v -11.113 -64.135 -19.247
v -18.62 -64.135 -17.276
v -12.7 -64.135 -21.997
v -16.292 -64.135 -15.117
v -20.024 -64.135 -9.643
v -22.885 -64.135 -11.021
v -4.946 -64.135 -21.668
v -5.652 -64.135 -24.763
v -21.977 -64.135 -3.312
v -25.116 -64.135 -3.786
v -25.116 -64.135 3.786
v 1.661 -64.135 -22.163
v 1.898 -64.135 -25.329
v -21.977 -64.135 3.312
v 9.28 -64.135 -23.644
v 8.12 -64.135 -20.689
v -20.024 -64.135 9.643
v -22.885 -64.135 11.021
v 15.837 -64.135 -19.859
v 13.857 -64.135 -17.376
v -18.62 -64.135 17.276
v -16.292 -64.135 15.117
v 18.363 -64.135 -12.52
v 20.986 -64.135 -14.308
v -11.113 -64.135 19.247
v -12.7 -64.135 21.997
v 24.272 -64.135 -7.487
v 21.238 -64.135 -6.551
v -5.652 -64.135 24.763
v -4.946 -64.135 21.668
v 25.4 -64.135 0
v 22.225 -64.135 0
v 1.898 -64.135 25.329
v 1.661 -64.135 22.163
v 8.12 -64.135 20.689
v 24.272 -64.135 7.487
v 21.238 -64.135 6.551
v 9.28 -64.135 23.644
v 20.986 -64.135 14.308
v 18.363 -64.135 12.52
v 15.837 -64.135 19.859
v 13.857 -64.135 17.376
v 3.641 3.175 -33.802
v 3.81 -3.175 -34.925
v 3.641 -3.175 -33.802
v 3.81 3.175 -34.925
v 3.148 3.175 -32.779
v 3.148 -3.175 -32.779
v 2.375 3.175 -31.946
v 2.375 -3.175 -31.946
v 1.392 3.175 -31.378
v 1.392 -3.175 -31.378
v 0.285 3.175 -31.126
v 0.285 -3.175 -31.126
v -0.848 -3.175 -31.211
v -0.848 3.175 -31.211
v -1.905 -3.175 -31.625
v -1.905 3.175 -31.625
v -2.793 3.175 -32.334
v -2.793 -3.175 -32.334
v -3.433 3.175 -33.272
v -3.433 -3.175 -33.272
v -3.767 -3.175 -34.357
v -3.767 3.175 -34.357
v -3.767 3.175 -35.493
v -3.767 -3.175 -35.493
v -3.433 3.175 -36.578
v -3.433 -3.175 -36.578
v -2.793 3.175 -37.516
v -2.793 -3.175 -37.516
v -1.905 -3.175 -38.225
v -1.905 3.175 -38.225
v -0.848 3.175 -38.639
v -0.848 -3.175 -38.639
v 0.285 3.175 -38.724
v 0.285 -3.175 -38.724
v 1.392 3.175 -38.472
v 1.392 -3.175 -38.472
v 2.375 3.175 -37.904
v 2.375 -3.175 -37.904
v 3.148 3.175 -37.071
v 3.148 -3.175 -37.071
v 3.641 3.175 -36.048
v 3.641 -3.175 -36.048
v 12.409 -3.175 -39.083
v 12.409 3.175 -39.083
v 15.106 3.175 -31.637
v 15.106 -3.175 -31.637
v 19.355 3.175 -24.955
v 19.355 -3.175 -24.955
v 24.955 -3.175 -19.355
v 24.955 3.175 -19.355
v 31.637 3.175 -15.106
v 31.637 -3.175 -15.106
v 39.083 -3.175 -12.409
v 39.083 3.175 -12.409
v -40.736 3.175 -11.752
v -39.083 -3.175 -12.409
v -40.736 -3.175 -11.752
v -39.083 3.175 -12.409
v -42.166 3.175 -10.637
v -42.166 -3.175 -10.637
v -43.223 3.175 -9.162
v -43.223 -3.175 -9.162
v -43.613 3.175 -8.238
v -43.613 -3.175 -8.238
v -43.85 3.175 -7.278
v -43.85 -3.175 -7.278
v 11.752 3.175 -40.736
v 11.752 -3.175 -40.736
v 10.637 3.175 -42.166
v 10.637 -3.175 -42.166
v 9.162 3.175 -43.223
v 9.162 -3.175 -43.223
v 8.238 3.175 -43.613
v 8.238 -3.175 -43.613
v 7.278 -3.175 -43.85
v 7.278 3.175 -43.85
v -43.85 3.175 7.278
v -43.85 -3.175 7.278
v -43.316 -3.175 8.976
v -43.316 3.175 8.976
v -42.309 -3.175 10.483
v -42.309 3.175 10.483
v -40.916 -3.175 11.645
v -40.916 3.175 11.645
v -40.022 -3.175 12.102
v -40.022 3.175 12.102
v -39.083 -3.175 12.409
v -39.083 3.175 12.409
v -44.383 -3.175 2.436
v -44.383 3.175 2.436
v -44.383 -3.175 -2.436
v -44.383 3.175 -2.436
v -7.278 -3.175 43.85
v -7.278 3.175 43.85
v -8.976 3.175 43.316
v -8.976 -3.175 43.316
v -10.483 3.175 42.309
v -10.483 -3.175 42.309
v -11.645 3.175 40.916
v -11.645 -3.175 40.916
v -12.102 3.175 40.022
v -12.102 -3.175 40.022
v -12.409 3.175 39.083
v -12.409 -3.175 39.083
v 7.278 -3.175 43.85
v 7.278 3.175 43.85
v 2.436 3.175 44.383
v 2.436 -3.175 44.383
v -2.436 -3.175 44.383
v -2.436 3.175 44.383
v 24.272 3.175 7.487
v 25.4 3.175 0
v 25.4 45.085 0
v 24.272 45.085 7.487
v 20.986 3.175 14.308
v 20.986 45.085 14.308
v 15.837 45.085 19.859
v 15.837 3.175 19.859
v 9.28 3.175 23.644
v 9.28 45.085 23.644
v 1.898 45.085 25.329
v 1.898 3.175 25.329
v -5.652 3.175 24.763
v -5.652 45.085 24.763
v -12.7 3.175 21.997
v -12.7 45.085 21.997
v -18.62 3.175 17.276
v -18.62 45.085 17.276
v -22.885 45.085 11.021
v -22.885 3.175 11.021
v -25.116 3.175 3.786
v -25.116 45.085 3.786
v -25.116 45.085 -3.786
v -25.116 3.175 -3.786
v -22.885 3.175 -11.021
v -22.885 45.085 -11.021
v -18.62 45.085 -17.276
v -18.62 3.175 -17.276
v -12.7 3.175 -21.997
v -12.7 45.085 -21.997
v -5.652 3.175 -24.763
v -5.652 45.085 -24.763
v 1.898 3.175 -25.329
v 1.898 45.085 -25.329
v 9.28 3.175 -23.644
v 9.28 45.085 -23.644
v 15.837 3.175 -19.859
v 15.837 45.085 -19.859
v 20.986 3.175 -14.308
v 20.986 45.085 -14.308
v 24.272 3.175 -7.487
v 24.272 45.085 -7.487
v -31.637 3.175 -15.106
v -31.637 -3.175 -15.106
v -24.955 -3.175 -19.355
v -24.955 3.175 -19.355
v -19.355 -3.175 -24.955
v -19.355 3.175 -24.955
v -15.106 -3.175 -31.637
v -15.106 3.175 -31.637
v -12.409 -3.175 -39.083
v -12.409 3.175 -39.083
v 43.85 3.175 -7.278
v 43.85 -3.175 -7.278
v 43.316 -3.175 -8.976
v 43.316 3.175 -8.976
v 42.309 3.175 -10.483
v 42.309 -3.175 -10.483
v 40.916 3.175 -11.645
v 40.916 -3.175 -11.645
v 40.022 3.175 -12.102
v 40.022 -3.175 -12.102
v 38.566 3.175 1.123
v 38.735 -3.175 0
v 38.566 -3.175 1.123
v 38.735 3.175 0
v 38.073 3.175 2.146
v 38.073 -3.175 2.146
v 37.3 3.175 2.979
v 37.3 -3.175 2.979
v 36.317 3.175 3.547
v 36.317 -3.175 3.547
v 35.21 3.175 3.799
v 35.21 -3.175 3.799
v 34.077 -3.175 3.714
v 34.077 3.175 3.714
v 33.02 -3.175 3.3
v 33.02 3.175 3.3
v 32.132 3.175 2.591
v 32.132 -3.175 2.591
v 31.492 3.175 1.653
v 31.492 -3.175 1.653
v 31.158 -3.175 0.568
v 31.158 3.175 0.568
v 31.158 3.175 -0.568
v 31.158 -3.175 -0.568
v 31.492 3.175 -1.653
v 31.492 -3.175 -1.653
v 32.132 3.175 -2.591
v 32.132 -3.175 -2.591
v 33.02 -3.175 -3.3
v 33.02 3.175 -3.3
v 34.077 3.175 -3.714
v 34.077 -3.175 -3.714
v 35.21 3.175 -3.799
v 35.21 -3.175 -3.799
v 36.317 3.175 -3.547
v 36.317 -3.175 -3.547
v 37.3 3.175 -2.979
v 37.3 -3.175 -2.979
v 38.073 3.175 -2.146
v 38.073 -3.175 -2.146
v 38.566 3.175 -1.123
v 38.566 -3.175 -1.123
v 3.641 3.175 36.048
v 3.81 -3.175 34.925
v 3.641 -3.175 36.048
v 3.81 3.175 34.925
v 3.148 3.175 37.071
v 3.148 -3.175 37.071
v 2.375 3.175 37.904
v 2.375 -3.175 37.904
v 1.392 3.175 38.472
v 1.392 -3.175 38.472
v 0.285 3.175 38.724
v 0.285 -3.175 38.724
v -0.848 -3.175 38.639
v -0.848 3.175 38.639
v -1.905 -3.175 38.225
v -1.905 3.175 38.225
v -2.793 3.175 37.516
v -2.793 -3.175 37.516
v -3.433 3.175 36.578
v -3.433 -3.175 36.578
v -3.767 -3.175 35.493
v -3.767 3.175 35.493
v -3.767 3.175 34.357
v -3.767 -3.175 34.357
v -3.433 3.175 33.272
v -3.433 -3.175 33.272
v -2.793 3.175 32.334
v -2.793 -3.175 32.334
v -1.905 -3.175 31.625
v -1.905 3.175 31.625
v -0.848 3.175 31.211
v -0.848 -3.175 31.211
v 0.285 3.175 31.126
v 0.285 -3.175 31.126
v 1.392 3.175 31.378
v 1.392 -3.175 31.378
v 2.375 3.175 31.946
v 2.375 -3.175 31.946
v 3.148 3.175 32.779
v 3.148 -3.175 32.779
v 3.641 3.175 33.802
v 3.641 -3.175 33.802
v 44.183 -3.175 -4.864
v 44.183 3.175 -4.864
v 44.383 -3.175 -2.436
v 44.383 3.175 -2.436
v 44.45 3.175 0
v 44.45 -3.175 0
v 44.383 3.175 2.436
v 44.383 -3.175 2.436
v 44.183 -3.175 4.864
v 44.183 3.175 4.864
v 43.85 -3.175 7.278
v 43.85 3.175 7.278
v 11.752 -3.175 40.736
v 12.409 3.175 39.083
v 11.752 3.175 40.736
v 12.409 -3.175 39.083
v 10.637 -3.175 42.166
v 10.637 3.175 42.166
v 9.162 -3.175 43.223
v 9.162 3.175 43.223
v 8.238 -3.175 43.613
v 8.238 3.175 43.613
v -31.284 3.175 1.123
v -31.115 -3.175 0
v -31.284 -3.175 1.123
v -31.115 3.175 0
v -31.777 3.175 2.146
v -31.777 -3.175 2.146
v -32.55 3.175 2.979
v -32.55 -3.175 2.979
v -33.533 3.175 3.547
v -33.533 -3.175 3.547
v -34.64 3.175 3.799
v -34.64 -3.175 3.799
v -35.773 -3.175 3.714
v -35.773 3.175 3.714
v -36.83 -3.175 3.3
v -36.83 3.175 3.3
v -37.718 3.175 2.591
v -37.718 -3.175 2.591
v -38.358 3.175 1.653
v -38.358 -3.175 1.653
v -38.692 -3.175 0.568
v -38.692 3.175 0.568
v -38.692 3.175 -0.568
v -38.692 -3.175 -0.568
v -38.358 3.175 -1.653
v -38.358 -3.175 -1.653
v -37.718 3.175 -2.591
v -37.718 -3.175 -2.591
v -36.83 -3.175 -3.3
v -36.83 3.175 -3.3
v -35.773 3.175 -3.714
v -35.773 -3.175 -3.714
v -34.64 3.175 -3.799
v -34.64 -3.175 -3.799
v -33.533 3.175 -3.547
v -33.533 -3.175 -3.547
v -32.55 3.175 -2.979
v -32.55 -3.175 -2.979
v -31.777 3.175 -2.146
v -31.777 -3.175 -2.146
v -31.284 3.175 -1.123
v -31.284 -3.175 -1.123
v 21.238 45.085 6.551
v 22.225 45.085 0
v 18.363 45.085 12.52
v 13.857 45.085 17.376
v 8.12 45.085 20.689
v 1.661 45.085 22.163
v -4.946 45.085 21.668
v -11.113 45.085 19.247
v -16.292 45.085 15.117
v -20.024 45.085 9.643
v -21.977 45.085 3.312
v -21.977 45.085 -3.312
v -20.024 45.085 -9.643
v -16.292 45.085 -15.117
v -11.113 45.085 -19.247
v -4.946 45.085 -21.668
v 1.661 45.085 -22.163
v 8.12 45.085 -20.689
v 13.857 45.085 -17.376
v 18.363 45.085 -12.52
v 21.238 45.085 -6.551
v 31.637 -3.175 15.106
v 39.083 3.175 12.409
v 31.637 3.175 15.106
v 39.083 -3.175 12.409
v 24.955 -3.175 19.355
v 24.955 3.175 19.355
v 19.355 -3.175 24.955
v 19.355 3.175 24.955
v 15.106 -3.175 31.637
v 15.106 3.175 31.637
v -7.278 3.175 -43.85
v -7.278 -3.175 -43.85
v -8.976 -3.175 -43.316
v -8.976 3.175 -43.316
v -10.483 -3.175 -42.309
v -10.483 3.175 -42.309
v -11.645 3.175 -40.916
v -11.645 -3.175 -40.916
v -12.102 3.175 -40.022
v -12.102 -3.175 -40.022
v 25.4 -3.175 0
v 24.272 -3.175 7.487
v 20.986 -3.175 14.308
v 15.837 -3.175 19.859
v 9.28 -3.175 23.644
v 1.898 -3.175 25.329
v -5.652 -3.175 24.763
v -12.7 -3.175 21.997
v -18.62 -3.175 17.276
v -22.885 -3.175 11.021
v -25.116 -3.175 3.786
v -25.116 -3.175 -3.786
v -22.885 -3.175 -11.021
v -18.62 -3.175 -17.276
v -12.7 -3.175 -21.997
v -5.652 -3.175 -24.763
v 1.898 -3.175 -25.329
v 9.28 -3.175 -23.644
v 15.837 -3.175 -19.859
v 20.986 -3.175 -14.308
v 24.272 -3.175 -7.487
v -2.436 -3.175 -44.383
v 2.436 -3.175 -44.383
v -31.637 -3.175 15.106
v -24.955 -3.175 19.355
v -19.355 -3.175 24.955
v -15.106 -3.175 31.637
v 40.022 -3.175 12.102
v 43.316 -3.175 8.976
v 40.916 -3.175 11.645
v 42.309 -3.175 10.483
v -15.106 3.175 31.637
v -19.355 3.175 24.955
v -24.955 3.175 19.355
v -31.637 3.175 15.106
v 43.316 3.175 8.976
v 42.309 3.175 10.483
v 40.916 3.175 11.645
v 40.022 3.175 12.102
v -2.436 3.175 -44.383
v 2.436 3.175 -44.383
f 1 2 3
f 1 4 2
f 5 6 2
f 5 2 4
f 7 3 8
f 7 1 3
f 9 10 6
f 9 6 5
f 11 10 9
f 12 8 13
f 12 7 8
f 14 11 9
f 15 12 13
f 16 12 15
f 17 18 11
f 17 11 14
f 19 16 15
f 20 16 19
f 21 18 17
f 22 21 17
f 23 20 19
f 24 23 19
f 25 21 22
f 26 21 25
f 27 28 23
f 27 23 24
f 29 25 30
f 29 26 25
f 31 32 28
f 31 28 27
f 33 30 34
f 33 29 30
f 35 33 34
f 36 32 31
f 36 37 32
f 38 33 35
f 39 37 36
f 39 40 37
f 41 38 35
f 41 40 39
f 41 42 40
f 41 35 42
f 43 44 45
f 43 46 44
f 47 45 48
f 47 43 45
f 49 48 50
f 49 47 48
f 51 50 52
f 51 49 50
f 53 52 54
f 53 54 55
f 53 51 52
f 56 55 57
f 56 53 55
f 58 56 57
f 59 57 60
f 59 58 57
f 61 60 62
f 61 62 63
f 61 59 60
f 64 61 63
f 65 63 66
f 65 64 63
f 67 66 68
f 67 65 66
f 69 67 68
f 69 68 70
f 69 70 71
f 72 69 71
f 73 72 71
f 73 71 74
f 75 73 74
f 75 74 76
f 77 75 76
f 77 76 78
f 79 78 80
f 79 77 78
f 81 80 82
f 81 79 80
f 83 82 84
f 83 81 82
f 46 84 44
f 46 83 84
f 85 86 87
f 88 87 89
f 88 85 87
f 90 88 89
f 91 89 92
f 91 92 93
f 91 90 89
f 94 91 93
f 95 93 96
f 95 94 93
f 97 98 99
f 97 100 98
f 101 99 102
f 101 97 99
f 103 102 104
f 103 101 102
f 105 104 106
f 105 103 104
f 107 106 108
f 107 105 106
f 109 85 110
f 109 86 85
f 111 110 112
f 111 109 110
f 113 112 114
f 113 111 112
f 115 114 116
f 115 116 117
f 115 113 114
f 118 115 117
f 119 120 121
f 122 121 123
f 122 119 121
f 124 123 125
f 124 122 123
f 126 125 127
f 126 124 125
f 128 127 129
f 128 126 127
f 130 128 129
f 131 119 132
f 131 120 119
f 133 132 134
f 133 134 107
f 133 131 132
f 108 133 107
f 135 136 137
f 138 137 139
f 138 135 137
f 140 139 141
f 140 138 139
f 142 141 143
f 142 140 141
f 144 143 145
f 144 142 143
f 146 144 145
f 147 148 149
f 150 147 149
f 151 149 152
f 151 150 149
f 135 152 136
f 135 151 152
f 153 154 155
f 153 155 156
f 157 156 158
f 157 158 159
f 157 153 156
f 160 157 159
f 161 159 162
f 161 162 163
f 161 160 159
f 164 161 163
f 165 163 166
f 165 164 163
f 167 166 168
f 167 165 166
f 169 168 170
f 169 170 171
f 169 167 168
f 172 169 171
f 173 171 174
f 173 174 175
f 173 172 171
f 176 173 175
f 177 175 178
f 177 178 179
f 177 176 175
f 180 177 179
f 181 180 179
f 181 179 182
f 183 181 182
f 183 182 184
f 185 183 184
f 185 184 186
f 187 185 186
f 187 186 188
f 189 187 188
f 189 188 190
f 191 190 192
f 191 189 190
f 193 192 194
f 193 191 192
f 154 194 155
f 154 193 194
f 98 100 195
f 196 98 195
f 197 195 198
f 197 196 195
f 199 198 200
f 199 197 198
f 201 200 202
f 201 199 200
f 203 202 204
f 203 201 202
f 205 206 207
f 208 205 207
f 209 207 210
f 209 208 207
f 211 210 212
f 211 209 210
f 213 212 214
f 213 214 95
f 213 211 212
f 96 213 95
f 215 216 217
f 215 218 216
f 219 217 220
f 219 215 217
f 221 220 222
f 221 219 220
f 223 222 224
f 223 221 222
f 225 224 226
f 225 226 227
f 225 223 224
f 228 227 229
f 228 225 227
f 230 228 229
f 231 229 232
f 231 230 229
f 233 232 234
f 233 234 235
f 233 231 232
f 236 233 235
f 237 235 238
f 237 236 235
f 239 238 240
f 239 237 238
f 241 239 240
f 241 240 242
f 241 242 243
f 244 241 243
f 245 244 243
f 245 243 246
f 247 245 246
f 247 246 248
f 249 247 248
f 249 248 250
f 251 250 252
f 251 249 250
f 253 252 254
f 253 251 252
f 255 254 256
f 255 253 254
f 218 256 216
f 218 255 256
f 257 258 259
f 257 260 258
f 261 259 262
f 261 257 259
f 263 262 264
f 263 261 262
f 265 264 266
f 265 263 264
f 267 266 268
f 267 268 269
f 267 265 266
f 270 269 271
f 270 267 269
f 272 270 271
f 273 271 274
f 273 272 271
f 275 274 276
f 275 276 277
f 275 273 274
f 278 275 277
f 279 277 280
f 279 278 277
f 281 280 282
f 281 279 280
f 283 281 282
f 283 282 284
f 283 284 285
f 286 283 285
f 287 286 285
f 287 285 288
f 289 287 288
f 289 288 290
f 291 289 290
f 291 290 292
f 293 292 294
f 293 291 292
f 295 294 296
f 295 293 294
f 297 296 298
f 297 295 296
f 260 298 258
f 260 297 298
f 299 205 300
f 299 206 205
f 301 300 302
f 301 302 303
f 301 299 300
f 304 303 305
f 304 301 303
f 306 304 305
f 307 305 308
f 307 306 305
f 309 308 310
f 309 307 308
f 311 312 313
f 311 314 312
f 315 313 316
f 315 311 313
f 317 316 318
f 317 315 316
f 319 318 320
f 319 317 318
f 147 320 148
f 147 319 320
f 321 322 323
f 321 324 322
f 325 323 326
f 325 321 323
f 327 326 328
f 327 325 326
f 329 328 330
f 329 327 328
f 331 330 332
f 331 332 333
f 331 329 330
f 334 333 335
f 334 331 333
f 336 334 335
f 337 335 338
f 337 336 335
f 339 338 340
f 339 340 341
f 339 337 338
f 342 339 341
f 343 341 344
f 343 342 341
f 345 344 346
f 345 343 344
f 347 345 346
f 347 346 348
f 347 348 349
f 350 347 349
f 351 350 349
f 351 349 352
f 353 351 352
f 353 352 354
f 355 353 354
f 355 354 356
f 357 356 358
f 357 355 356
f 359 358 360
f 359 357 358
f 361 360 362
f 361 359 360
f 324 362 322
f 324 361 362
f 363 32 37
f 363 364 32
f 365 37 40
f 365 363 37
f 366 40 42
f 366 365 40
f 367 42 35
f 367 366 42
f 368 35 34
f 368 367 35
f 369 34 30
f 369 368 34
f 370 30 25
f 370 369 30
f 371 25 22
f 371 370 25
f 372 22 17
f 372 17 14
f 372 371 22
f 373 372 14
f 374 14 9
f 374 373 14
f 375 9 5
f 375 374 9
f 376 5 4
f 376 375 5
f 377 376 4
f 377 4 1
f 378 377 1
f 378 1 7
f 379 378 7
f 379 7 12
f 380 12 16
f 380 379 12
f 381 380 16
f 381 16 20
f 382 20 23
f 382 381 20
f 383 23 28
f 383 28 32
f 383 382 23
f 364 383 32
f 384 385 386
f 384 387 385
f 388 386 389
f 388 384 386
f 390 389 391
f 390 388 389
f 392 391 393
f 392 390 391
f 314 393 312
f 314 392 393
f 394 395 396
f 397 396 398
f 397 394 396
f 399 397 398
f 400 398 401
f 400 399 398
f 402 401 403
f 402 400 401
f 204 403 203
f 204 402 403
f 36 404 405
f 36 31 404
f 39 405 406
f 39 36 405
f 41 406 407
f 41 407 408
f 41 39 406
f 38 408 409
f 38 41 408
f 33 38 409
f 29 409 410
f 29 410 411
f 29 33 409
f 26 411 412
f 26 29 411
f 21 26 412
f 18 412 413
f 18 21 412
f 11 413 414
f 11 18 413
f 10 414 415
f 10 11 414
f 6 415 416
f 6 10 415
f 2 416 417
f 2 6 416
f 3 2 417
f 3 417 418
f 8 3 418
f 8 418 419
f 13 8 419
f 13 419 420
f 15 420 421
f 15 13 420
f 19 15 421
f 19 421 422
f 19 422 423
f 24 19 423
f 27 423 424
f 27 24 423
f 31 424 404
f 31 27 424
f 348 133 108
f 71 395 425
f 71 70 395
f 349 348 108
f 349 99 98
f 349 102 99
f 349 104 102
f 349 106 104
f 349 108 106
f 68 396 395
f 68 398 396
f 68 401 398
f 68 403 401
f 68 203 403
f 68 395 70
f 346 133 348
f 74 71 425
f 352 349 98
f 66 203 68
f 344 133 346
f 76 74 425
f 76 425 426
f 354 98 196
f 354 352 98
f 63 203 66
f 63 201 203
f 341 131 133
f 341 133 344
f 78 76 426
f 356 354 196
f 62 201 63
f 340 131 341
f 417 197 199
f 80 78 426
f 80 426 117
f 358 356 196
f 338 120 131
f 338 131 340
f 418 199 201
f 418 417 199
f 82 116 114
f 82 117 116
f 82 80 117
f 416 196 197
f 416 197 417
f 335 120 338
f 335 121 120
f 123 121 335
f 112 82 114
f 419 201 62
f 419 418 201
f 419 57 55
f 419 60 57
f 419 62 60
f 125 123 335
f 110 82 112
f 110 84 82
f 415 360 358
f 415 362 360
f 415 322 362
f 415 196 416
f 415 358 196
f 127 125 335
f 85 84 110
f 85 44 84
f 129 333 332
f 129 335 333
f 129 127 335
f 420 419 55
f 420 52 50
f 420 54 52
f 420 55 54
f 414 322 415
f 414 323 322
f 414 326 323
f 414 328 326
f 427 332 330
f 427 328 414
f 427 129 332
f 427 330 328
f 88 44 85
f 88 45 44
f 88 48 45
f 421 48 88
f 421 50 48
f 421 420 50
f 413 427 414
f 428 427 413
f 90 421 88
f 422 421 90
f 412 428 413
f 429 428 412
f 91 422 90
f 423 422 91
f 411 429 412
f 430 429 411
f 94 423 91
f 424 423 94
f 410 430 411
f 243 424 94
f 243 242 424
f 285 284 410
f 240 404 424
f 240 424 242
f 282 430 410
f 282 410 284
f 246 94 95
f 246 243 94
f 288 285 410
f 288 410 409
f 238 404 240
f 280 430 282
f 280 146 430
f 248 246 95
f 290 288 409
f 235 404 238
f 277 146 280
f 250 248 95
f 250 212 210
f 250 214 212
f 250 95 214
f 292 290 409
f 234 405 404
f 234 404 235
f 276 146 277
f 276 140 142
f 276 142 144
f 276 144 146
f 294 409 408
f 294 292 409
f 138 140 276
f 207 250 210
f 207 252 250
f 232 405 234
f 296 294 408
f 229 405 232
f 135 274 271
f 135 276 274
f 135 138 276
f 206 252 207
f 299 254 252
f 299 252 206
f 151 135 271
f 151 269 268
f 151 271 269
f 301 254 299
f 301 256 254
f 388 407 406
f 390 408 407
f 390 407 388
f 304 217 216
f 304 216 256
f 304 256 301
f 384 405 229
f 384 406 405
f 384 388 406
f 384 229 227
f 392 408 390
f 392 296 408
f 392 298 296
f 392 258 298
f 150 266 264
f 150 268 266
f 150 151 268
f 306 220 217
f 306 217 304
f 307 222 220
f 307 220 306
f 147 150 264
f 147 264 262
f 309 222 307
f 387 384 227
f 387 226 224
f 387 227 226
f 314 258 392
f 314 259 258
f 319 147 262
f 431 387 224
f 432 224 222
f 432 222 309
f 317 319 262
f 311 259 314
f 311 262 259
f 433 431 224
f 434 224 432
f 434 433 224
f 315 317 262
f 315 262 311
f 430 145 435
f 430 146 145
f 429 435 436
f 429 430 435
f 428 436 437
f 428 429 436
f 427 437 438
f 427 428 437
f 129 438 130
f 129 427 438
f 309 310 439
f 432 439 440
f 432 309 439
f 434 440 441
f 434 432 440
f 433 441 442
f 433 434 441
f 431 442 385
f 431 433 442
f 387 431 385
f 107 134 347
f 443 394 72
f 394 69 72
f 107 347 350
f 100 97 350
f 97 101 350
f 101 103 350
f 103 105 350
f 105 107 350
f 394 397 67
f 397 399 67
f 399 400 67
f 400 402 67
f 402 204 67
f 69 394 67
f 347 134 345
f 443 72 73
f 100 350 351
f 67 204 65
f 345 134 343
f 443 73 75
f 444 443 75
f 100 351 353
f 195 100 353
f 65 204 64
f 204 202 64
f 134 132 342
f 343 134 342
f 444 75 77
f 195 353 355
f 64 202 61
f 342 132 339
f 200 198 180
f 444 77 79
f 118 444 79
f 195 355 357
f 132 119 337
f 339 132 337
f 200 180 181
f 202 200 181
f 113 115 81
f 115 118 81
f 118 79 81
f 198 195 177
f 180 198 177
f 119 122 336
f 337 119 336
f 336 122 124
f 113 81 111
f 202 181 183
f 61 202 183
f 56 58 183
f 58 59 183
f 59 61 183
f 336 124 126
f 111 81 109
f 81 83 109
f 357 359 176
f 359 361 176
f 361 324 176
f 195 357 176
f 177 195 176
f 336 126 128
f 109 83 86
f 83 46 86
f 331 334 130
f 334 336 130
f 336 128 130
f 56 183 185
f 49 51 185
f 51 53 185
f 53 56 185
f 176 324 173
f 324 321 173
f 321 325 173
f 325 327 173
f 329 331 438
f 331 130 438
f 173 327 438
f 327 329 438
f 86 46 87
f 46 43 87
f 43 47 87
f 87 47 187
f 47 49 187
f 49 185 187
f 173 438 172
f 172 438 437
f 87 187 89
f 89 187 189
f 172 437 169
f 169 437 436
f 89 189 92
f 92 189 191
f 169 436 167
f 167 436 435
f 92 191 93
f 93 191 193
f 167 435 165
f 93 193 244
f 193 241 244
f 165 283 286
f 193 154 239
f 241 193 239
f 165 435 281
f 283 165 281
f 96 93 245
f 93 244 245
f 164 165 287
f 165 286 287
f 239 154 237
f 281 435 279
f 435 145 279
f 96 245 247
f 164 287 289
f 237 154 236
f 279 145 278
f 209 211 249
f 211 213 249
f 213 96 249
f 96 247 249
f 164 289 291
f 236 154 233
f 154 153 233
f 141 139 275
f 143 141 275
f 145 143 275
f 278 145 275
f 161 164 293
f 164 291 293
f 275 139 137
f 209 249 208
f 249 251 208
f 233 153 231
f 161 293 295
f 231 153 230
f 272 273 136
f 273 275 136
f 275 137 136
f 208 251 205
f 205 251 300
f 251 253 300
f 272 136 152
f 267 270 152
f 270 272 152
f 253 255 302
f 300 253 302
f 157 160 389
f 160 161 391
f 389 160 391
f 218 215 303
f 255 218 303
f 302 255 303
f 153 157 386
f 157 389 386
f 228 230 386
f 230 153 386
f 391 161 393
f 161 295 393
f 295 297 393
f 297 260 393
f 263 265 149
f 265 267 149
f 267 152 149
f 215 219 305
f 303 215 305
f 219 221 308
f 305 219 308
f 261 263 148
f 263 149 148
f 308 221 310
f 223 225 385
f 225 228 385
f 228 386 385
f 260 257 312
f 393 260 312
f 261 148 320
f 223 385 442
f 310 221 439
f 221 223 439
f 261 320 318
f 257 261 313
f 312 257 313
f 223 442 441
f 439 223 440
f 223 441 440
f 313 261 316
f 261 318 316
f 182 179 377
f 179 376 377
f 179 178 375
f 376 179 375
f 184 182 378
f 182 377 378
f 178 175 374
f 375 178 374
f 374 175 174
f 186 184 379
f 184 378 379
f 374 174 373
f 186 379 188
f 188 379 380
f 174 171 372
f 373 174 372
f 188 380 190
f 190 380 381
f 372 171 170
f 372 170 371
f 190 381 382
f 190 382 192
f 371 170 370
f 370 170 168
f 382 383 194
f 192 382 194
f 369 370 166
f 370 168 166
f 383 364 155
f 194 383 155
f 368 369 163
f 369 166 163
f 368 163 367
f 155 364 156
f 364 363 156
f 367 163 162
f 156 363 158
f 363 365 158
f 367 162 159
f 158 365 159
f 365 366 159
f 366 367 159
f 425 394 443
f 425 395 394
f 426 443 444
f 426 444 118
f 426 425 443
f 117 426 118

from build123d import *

# Parameters (mm, degrees)
F1_R     = 25.4
F1_R_2   = 22.225
F2_DEPTH = 54.61
F3_R     = 3.81
F3_R_2   = 25.4
F4_DEPTH = 3.175
F5_R     = 6.35


with BuildPart() as f2:
    # F1 (on offset) → F2 (new body, symmetric)
    with BuildSketch(Plane.XZ.offset(9.525)):
        Circle(F1_R)
        Circle(F1_R_2, mode=Mode.SUBTRACT)
    extrude(amount=F2_DEPTH, both=True)

    # F3 (on Front) → F4 (join, symmetric)
    with BuildSketch(Plane.XZ):
        with BuildLine():
            ThreePointArc((42.8826136347, -11.6997413585), (44.0564108619, -5.902131985), (44.45, 0))
            ThreePointArc((44.45, 0), (44.0564108619, 5.902131985), (42.8826136347, 11.6997413585))
            ThreePointArc((42.8826136347, 11.6997413585), (22.0016274966, 22.0016274966), (11.6997413585, 42.8826136347))
            ThreePointArc((11.6997413585, 42.8826136347), (0, 44.45), (-11.6997413585, 42.8826136347))
            ThreePointArc((-11.6997413585, 42.8826136347), (-22.0016274966, 22.0016274966), (-42.8826136347, 11.6997413585))
            ThreePointArc((-42.8826136347, 11.6997413585), (-44.45, 0), (-42.8826136347, -11.6997413585))
            ThreePointArc((-42.8826136347, -11.6997413585), (-22.0016274966, -22.0016274966), (-11.6997413585, -42.8826136347))
            ThreePointArc((-11.6997413585, -42.8826136347), (0, -44.45), (11.6997413585, -42.8826136347))
            ThreePointArc((11.6997413585, -42.8826136347), (22.0016274966, -22.0016274966), (42.8826136347, -11.6997413585))
        make_face()
        with Locations((0, -34.925)):
            Circle(F3_R, mode=Mode.SUBTRACT)
        with Locations((-34.925, 0)):
            Circle(F3_R, mode=Mode.SUBTRACT)
        Circle(F3_R_2, mode=Mode.SUBTRACT)
        with Locations((34.925, 0)):
            Circle(F3_R, mode=Mode.SUBTRACT)
        with Locations((0, 34.925)):
            Circle(F3_R, mode=Mode.SUBTRACT)
    extrude(amount=F4_DEPTH, both=True)

    # F5
    f5_edges = [f2.edges().sort_by_distance(p)[0] for p in [
        (11.699741, 0, 42.882614),
        (-42.882614, 0, 11.699741),
        (-11.699741, 0, -42.882614),
        (42.882614, 0, -11.699741),
        (42.882614, 0, 11.699741),
        (-11.699741, 0, 42.882614),
        (-42.882614, 0, -11.699741),
        (11.699741, 0, -42.882614),
    ]]
    fillet(f5_edges, radius=F5_R)


solid = f2.part
